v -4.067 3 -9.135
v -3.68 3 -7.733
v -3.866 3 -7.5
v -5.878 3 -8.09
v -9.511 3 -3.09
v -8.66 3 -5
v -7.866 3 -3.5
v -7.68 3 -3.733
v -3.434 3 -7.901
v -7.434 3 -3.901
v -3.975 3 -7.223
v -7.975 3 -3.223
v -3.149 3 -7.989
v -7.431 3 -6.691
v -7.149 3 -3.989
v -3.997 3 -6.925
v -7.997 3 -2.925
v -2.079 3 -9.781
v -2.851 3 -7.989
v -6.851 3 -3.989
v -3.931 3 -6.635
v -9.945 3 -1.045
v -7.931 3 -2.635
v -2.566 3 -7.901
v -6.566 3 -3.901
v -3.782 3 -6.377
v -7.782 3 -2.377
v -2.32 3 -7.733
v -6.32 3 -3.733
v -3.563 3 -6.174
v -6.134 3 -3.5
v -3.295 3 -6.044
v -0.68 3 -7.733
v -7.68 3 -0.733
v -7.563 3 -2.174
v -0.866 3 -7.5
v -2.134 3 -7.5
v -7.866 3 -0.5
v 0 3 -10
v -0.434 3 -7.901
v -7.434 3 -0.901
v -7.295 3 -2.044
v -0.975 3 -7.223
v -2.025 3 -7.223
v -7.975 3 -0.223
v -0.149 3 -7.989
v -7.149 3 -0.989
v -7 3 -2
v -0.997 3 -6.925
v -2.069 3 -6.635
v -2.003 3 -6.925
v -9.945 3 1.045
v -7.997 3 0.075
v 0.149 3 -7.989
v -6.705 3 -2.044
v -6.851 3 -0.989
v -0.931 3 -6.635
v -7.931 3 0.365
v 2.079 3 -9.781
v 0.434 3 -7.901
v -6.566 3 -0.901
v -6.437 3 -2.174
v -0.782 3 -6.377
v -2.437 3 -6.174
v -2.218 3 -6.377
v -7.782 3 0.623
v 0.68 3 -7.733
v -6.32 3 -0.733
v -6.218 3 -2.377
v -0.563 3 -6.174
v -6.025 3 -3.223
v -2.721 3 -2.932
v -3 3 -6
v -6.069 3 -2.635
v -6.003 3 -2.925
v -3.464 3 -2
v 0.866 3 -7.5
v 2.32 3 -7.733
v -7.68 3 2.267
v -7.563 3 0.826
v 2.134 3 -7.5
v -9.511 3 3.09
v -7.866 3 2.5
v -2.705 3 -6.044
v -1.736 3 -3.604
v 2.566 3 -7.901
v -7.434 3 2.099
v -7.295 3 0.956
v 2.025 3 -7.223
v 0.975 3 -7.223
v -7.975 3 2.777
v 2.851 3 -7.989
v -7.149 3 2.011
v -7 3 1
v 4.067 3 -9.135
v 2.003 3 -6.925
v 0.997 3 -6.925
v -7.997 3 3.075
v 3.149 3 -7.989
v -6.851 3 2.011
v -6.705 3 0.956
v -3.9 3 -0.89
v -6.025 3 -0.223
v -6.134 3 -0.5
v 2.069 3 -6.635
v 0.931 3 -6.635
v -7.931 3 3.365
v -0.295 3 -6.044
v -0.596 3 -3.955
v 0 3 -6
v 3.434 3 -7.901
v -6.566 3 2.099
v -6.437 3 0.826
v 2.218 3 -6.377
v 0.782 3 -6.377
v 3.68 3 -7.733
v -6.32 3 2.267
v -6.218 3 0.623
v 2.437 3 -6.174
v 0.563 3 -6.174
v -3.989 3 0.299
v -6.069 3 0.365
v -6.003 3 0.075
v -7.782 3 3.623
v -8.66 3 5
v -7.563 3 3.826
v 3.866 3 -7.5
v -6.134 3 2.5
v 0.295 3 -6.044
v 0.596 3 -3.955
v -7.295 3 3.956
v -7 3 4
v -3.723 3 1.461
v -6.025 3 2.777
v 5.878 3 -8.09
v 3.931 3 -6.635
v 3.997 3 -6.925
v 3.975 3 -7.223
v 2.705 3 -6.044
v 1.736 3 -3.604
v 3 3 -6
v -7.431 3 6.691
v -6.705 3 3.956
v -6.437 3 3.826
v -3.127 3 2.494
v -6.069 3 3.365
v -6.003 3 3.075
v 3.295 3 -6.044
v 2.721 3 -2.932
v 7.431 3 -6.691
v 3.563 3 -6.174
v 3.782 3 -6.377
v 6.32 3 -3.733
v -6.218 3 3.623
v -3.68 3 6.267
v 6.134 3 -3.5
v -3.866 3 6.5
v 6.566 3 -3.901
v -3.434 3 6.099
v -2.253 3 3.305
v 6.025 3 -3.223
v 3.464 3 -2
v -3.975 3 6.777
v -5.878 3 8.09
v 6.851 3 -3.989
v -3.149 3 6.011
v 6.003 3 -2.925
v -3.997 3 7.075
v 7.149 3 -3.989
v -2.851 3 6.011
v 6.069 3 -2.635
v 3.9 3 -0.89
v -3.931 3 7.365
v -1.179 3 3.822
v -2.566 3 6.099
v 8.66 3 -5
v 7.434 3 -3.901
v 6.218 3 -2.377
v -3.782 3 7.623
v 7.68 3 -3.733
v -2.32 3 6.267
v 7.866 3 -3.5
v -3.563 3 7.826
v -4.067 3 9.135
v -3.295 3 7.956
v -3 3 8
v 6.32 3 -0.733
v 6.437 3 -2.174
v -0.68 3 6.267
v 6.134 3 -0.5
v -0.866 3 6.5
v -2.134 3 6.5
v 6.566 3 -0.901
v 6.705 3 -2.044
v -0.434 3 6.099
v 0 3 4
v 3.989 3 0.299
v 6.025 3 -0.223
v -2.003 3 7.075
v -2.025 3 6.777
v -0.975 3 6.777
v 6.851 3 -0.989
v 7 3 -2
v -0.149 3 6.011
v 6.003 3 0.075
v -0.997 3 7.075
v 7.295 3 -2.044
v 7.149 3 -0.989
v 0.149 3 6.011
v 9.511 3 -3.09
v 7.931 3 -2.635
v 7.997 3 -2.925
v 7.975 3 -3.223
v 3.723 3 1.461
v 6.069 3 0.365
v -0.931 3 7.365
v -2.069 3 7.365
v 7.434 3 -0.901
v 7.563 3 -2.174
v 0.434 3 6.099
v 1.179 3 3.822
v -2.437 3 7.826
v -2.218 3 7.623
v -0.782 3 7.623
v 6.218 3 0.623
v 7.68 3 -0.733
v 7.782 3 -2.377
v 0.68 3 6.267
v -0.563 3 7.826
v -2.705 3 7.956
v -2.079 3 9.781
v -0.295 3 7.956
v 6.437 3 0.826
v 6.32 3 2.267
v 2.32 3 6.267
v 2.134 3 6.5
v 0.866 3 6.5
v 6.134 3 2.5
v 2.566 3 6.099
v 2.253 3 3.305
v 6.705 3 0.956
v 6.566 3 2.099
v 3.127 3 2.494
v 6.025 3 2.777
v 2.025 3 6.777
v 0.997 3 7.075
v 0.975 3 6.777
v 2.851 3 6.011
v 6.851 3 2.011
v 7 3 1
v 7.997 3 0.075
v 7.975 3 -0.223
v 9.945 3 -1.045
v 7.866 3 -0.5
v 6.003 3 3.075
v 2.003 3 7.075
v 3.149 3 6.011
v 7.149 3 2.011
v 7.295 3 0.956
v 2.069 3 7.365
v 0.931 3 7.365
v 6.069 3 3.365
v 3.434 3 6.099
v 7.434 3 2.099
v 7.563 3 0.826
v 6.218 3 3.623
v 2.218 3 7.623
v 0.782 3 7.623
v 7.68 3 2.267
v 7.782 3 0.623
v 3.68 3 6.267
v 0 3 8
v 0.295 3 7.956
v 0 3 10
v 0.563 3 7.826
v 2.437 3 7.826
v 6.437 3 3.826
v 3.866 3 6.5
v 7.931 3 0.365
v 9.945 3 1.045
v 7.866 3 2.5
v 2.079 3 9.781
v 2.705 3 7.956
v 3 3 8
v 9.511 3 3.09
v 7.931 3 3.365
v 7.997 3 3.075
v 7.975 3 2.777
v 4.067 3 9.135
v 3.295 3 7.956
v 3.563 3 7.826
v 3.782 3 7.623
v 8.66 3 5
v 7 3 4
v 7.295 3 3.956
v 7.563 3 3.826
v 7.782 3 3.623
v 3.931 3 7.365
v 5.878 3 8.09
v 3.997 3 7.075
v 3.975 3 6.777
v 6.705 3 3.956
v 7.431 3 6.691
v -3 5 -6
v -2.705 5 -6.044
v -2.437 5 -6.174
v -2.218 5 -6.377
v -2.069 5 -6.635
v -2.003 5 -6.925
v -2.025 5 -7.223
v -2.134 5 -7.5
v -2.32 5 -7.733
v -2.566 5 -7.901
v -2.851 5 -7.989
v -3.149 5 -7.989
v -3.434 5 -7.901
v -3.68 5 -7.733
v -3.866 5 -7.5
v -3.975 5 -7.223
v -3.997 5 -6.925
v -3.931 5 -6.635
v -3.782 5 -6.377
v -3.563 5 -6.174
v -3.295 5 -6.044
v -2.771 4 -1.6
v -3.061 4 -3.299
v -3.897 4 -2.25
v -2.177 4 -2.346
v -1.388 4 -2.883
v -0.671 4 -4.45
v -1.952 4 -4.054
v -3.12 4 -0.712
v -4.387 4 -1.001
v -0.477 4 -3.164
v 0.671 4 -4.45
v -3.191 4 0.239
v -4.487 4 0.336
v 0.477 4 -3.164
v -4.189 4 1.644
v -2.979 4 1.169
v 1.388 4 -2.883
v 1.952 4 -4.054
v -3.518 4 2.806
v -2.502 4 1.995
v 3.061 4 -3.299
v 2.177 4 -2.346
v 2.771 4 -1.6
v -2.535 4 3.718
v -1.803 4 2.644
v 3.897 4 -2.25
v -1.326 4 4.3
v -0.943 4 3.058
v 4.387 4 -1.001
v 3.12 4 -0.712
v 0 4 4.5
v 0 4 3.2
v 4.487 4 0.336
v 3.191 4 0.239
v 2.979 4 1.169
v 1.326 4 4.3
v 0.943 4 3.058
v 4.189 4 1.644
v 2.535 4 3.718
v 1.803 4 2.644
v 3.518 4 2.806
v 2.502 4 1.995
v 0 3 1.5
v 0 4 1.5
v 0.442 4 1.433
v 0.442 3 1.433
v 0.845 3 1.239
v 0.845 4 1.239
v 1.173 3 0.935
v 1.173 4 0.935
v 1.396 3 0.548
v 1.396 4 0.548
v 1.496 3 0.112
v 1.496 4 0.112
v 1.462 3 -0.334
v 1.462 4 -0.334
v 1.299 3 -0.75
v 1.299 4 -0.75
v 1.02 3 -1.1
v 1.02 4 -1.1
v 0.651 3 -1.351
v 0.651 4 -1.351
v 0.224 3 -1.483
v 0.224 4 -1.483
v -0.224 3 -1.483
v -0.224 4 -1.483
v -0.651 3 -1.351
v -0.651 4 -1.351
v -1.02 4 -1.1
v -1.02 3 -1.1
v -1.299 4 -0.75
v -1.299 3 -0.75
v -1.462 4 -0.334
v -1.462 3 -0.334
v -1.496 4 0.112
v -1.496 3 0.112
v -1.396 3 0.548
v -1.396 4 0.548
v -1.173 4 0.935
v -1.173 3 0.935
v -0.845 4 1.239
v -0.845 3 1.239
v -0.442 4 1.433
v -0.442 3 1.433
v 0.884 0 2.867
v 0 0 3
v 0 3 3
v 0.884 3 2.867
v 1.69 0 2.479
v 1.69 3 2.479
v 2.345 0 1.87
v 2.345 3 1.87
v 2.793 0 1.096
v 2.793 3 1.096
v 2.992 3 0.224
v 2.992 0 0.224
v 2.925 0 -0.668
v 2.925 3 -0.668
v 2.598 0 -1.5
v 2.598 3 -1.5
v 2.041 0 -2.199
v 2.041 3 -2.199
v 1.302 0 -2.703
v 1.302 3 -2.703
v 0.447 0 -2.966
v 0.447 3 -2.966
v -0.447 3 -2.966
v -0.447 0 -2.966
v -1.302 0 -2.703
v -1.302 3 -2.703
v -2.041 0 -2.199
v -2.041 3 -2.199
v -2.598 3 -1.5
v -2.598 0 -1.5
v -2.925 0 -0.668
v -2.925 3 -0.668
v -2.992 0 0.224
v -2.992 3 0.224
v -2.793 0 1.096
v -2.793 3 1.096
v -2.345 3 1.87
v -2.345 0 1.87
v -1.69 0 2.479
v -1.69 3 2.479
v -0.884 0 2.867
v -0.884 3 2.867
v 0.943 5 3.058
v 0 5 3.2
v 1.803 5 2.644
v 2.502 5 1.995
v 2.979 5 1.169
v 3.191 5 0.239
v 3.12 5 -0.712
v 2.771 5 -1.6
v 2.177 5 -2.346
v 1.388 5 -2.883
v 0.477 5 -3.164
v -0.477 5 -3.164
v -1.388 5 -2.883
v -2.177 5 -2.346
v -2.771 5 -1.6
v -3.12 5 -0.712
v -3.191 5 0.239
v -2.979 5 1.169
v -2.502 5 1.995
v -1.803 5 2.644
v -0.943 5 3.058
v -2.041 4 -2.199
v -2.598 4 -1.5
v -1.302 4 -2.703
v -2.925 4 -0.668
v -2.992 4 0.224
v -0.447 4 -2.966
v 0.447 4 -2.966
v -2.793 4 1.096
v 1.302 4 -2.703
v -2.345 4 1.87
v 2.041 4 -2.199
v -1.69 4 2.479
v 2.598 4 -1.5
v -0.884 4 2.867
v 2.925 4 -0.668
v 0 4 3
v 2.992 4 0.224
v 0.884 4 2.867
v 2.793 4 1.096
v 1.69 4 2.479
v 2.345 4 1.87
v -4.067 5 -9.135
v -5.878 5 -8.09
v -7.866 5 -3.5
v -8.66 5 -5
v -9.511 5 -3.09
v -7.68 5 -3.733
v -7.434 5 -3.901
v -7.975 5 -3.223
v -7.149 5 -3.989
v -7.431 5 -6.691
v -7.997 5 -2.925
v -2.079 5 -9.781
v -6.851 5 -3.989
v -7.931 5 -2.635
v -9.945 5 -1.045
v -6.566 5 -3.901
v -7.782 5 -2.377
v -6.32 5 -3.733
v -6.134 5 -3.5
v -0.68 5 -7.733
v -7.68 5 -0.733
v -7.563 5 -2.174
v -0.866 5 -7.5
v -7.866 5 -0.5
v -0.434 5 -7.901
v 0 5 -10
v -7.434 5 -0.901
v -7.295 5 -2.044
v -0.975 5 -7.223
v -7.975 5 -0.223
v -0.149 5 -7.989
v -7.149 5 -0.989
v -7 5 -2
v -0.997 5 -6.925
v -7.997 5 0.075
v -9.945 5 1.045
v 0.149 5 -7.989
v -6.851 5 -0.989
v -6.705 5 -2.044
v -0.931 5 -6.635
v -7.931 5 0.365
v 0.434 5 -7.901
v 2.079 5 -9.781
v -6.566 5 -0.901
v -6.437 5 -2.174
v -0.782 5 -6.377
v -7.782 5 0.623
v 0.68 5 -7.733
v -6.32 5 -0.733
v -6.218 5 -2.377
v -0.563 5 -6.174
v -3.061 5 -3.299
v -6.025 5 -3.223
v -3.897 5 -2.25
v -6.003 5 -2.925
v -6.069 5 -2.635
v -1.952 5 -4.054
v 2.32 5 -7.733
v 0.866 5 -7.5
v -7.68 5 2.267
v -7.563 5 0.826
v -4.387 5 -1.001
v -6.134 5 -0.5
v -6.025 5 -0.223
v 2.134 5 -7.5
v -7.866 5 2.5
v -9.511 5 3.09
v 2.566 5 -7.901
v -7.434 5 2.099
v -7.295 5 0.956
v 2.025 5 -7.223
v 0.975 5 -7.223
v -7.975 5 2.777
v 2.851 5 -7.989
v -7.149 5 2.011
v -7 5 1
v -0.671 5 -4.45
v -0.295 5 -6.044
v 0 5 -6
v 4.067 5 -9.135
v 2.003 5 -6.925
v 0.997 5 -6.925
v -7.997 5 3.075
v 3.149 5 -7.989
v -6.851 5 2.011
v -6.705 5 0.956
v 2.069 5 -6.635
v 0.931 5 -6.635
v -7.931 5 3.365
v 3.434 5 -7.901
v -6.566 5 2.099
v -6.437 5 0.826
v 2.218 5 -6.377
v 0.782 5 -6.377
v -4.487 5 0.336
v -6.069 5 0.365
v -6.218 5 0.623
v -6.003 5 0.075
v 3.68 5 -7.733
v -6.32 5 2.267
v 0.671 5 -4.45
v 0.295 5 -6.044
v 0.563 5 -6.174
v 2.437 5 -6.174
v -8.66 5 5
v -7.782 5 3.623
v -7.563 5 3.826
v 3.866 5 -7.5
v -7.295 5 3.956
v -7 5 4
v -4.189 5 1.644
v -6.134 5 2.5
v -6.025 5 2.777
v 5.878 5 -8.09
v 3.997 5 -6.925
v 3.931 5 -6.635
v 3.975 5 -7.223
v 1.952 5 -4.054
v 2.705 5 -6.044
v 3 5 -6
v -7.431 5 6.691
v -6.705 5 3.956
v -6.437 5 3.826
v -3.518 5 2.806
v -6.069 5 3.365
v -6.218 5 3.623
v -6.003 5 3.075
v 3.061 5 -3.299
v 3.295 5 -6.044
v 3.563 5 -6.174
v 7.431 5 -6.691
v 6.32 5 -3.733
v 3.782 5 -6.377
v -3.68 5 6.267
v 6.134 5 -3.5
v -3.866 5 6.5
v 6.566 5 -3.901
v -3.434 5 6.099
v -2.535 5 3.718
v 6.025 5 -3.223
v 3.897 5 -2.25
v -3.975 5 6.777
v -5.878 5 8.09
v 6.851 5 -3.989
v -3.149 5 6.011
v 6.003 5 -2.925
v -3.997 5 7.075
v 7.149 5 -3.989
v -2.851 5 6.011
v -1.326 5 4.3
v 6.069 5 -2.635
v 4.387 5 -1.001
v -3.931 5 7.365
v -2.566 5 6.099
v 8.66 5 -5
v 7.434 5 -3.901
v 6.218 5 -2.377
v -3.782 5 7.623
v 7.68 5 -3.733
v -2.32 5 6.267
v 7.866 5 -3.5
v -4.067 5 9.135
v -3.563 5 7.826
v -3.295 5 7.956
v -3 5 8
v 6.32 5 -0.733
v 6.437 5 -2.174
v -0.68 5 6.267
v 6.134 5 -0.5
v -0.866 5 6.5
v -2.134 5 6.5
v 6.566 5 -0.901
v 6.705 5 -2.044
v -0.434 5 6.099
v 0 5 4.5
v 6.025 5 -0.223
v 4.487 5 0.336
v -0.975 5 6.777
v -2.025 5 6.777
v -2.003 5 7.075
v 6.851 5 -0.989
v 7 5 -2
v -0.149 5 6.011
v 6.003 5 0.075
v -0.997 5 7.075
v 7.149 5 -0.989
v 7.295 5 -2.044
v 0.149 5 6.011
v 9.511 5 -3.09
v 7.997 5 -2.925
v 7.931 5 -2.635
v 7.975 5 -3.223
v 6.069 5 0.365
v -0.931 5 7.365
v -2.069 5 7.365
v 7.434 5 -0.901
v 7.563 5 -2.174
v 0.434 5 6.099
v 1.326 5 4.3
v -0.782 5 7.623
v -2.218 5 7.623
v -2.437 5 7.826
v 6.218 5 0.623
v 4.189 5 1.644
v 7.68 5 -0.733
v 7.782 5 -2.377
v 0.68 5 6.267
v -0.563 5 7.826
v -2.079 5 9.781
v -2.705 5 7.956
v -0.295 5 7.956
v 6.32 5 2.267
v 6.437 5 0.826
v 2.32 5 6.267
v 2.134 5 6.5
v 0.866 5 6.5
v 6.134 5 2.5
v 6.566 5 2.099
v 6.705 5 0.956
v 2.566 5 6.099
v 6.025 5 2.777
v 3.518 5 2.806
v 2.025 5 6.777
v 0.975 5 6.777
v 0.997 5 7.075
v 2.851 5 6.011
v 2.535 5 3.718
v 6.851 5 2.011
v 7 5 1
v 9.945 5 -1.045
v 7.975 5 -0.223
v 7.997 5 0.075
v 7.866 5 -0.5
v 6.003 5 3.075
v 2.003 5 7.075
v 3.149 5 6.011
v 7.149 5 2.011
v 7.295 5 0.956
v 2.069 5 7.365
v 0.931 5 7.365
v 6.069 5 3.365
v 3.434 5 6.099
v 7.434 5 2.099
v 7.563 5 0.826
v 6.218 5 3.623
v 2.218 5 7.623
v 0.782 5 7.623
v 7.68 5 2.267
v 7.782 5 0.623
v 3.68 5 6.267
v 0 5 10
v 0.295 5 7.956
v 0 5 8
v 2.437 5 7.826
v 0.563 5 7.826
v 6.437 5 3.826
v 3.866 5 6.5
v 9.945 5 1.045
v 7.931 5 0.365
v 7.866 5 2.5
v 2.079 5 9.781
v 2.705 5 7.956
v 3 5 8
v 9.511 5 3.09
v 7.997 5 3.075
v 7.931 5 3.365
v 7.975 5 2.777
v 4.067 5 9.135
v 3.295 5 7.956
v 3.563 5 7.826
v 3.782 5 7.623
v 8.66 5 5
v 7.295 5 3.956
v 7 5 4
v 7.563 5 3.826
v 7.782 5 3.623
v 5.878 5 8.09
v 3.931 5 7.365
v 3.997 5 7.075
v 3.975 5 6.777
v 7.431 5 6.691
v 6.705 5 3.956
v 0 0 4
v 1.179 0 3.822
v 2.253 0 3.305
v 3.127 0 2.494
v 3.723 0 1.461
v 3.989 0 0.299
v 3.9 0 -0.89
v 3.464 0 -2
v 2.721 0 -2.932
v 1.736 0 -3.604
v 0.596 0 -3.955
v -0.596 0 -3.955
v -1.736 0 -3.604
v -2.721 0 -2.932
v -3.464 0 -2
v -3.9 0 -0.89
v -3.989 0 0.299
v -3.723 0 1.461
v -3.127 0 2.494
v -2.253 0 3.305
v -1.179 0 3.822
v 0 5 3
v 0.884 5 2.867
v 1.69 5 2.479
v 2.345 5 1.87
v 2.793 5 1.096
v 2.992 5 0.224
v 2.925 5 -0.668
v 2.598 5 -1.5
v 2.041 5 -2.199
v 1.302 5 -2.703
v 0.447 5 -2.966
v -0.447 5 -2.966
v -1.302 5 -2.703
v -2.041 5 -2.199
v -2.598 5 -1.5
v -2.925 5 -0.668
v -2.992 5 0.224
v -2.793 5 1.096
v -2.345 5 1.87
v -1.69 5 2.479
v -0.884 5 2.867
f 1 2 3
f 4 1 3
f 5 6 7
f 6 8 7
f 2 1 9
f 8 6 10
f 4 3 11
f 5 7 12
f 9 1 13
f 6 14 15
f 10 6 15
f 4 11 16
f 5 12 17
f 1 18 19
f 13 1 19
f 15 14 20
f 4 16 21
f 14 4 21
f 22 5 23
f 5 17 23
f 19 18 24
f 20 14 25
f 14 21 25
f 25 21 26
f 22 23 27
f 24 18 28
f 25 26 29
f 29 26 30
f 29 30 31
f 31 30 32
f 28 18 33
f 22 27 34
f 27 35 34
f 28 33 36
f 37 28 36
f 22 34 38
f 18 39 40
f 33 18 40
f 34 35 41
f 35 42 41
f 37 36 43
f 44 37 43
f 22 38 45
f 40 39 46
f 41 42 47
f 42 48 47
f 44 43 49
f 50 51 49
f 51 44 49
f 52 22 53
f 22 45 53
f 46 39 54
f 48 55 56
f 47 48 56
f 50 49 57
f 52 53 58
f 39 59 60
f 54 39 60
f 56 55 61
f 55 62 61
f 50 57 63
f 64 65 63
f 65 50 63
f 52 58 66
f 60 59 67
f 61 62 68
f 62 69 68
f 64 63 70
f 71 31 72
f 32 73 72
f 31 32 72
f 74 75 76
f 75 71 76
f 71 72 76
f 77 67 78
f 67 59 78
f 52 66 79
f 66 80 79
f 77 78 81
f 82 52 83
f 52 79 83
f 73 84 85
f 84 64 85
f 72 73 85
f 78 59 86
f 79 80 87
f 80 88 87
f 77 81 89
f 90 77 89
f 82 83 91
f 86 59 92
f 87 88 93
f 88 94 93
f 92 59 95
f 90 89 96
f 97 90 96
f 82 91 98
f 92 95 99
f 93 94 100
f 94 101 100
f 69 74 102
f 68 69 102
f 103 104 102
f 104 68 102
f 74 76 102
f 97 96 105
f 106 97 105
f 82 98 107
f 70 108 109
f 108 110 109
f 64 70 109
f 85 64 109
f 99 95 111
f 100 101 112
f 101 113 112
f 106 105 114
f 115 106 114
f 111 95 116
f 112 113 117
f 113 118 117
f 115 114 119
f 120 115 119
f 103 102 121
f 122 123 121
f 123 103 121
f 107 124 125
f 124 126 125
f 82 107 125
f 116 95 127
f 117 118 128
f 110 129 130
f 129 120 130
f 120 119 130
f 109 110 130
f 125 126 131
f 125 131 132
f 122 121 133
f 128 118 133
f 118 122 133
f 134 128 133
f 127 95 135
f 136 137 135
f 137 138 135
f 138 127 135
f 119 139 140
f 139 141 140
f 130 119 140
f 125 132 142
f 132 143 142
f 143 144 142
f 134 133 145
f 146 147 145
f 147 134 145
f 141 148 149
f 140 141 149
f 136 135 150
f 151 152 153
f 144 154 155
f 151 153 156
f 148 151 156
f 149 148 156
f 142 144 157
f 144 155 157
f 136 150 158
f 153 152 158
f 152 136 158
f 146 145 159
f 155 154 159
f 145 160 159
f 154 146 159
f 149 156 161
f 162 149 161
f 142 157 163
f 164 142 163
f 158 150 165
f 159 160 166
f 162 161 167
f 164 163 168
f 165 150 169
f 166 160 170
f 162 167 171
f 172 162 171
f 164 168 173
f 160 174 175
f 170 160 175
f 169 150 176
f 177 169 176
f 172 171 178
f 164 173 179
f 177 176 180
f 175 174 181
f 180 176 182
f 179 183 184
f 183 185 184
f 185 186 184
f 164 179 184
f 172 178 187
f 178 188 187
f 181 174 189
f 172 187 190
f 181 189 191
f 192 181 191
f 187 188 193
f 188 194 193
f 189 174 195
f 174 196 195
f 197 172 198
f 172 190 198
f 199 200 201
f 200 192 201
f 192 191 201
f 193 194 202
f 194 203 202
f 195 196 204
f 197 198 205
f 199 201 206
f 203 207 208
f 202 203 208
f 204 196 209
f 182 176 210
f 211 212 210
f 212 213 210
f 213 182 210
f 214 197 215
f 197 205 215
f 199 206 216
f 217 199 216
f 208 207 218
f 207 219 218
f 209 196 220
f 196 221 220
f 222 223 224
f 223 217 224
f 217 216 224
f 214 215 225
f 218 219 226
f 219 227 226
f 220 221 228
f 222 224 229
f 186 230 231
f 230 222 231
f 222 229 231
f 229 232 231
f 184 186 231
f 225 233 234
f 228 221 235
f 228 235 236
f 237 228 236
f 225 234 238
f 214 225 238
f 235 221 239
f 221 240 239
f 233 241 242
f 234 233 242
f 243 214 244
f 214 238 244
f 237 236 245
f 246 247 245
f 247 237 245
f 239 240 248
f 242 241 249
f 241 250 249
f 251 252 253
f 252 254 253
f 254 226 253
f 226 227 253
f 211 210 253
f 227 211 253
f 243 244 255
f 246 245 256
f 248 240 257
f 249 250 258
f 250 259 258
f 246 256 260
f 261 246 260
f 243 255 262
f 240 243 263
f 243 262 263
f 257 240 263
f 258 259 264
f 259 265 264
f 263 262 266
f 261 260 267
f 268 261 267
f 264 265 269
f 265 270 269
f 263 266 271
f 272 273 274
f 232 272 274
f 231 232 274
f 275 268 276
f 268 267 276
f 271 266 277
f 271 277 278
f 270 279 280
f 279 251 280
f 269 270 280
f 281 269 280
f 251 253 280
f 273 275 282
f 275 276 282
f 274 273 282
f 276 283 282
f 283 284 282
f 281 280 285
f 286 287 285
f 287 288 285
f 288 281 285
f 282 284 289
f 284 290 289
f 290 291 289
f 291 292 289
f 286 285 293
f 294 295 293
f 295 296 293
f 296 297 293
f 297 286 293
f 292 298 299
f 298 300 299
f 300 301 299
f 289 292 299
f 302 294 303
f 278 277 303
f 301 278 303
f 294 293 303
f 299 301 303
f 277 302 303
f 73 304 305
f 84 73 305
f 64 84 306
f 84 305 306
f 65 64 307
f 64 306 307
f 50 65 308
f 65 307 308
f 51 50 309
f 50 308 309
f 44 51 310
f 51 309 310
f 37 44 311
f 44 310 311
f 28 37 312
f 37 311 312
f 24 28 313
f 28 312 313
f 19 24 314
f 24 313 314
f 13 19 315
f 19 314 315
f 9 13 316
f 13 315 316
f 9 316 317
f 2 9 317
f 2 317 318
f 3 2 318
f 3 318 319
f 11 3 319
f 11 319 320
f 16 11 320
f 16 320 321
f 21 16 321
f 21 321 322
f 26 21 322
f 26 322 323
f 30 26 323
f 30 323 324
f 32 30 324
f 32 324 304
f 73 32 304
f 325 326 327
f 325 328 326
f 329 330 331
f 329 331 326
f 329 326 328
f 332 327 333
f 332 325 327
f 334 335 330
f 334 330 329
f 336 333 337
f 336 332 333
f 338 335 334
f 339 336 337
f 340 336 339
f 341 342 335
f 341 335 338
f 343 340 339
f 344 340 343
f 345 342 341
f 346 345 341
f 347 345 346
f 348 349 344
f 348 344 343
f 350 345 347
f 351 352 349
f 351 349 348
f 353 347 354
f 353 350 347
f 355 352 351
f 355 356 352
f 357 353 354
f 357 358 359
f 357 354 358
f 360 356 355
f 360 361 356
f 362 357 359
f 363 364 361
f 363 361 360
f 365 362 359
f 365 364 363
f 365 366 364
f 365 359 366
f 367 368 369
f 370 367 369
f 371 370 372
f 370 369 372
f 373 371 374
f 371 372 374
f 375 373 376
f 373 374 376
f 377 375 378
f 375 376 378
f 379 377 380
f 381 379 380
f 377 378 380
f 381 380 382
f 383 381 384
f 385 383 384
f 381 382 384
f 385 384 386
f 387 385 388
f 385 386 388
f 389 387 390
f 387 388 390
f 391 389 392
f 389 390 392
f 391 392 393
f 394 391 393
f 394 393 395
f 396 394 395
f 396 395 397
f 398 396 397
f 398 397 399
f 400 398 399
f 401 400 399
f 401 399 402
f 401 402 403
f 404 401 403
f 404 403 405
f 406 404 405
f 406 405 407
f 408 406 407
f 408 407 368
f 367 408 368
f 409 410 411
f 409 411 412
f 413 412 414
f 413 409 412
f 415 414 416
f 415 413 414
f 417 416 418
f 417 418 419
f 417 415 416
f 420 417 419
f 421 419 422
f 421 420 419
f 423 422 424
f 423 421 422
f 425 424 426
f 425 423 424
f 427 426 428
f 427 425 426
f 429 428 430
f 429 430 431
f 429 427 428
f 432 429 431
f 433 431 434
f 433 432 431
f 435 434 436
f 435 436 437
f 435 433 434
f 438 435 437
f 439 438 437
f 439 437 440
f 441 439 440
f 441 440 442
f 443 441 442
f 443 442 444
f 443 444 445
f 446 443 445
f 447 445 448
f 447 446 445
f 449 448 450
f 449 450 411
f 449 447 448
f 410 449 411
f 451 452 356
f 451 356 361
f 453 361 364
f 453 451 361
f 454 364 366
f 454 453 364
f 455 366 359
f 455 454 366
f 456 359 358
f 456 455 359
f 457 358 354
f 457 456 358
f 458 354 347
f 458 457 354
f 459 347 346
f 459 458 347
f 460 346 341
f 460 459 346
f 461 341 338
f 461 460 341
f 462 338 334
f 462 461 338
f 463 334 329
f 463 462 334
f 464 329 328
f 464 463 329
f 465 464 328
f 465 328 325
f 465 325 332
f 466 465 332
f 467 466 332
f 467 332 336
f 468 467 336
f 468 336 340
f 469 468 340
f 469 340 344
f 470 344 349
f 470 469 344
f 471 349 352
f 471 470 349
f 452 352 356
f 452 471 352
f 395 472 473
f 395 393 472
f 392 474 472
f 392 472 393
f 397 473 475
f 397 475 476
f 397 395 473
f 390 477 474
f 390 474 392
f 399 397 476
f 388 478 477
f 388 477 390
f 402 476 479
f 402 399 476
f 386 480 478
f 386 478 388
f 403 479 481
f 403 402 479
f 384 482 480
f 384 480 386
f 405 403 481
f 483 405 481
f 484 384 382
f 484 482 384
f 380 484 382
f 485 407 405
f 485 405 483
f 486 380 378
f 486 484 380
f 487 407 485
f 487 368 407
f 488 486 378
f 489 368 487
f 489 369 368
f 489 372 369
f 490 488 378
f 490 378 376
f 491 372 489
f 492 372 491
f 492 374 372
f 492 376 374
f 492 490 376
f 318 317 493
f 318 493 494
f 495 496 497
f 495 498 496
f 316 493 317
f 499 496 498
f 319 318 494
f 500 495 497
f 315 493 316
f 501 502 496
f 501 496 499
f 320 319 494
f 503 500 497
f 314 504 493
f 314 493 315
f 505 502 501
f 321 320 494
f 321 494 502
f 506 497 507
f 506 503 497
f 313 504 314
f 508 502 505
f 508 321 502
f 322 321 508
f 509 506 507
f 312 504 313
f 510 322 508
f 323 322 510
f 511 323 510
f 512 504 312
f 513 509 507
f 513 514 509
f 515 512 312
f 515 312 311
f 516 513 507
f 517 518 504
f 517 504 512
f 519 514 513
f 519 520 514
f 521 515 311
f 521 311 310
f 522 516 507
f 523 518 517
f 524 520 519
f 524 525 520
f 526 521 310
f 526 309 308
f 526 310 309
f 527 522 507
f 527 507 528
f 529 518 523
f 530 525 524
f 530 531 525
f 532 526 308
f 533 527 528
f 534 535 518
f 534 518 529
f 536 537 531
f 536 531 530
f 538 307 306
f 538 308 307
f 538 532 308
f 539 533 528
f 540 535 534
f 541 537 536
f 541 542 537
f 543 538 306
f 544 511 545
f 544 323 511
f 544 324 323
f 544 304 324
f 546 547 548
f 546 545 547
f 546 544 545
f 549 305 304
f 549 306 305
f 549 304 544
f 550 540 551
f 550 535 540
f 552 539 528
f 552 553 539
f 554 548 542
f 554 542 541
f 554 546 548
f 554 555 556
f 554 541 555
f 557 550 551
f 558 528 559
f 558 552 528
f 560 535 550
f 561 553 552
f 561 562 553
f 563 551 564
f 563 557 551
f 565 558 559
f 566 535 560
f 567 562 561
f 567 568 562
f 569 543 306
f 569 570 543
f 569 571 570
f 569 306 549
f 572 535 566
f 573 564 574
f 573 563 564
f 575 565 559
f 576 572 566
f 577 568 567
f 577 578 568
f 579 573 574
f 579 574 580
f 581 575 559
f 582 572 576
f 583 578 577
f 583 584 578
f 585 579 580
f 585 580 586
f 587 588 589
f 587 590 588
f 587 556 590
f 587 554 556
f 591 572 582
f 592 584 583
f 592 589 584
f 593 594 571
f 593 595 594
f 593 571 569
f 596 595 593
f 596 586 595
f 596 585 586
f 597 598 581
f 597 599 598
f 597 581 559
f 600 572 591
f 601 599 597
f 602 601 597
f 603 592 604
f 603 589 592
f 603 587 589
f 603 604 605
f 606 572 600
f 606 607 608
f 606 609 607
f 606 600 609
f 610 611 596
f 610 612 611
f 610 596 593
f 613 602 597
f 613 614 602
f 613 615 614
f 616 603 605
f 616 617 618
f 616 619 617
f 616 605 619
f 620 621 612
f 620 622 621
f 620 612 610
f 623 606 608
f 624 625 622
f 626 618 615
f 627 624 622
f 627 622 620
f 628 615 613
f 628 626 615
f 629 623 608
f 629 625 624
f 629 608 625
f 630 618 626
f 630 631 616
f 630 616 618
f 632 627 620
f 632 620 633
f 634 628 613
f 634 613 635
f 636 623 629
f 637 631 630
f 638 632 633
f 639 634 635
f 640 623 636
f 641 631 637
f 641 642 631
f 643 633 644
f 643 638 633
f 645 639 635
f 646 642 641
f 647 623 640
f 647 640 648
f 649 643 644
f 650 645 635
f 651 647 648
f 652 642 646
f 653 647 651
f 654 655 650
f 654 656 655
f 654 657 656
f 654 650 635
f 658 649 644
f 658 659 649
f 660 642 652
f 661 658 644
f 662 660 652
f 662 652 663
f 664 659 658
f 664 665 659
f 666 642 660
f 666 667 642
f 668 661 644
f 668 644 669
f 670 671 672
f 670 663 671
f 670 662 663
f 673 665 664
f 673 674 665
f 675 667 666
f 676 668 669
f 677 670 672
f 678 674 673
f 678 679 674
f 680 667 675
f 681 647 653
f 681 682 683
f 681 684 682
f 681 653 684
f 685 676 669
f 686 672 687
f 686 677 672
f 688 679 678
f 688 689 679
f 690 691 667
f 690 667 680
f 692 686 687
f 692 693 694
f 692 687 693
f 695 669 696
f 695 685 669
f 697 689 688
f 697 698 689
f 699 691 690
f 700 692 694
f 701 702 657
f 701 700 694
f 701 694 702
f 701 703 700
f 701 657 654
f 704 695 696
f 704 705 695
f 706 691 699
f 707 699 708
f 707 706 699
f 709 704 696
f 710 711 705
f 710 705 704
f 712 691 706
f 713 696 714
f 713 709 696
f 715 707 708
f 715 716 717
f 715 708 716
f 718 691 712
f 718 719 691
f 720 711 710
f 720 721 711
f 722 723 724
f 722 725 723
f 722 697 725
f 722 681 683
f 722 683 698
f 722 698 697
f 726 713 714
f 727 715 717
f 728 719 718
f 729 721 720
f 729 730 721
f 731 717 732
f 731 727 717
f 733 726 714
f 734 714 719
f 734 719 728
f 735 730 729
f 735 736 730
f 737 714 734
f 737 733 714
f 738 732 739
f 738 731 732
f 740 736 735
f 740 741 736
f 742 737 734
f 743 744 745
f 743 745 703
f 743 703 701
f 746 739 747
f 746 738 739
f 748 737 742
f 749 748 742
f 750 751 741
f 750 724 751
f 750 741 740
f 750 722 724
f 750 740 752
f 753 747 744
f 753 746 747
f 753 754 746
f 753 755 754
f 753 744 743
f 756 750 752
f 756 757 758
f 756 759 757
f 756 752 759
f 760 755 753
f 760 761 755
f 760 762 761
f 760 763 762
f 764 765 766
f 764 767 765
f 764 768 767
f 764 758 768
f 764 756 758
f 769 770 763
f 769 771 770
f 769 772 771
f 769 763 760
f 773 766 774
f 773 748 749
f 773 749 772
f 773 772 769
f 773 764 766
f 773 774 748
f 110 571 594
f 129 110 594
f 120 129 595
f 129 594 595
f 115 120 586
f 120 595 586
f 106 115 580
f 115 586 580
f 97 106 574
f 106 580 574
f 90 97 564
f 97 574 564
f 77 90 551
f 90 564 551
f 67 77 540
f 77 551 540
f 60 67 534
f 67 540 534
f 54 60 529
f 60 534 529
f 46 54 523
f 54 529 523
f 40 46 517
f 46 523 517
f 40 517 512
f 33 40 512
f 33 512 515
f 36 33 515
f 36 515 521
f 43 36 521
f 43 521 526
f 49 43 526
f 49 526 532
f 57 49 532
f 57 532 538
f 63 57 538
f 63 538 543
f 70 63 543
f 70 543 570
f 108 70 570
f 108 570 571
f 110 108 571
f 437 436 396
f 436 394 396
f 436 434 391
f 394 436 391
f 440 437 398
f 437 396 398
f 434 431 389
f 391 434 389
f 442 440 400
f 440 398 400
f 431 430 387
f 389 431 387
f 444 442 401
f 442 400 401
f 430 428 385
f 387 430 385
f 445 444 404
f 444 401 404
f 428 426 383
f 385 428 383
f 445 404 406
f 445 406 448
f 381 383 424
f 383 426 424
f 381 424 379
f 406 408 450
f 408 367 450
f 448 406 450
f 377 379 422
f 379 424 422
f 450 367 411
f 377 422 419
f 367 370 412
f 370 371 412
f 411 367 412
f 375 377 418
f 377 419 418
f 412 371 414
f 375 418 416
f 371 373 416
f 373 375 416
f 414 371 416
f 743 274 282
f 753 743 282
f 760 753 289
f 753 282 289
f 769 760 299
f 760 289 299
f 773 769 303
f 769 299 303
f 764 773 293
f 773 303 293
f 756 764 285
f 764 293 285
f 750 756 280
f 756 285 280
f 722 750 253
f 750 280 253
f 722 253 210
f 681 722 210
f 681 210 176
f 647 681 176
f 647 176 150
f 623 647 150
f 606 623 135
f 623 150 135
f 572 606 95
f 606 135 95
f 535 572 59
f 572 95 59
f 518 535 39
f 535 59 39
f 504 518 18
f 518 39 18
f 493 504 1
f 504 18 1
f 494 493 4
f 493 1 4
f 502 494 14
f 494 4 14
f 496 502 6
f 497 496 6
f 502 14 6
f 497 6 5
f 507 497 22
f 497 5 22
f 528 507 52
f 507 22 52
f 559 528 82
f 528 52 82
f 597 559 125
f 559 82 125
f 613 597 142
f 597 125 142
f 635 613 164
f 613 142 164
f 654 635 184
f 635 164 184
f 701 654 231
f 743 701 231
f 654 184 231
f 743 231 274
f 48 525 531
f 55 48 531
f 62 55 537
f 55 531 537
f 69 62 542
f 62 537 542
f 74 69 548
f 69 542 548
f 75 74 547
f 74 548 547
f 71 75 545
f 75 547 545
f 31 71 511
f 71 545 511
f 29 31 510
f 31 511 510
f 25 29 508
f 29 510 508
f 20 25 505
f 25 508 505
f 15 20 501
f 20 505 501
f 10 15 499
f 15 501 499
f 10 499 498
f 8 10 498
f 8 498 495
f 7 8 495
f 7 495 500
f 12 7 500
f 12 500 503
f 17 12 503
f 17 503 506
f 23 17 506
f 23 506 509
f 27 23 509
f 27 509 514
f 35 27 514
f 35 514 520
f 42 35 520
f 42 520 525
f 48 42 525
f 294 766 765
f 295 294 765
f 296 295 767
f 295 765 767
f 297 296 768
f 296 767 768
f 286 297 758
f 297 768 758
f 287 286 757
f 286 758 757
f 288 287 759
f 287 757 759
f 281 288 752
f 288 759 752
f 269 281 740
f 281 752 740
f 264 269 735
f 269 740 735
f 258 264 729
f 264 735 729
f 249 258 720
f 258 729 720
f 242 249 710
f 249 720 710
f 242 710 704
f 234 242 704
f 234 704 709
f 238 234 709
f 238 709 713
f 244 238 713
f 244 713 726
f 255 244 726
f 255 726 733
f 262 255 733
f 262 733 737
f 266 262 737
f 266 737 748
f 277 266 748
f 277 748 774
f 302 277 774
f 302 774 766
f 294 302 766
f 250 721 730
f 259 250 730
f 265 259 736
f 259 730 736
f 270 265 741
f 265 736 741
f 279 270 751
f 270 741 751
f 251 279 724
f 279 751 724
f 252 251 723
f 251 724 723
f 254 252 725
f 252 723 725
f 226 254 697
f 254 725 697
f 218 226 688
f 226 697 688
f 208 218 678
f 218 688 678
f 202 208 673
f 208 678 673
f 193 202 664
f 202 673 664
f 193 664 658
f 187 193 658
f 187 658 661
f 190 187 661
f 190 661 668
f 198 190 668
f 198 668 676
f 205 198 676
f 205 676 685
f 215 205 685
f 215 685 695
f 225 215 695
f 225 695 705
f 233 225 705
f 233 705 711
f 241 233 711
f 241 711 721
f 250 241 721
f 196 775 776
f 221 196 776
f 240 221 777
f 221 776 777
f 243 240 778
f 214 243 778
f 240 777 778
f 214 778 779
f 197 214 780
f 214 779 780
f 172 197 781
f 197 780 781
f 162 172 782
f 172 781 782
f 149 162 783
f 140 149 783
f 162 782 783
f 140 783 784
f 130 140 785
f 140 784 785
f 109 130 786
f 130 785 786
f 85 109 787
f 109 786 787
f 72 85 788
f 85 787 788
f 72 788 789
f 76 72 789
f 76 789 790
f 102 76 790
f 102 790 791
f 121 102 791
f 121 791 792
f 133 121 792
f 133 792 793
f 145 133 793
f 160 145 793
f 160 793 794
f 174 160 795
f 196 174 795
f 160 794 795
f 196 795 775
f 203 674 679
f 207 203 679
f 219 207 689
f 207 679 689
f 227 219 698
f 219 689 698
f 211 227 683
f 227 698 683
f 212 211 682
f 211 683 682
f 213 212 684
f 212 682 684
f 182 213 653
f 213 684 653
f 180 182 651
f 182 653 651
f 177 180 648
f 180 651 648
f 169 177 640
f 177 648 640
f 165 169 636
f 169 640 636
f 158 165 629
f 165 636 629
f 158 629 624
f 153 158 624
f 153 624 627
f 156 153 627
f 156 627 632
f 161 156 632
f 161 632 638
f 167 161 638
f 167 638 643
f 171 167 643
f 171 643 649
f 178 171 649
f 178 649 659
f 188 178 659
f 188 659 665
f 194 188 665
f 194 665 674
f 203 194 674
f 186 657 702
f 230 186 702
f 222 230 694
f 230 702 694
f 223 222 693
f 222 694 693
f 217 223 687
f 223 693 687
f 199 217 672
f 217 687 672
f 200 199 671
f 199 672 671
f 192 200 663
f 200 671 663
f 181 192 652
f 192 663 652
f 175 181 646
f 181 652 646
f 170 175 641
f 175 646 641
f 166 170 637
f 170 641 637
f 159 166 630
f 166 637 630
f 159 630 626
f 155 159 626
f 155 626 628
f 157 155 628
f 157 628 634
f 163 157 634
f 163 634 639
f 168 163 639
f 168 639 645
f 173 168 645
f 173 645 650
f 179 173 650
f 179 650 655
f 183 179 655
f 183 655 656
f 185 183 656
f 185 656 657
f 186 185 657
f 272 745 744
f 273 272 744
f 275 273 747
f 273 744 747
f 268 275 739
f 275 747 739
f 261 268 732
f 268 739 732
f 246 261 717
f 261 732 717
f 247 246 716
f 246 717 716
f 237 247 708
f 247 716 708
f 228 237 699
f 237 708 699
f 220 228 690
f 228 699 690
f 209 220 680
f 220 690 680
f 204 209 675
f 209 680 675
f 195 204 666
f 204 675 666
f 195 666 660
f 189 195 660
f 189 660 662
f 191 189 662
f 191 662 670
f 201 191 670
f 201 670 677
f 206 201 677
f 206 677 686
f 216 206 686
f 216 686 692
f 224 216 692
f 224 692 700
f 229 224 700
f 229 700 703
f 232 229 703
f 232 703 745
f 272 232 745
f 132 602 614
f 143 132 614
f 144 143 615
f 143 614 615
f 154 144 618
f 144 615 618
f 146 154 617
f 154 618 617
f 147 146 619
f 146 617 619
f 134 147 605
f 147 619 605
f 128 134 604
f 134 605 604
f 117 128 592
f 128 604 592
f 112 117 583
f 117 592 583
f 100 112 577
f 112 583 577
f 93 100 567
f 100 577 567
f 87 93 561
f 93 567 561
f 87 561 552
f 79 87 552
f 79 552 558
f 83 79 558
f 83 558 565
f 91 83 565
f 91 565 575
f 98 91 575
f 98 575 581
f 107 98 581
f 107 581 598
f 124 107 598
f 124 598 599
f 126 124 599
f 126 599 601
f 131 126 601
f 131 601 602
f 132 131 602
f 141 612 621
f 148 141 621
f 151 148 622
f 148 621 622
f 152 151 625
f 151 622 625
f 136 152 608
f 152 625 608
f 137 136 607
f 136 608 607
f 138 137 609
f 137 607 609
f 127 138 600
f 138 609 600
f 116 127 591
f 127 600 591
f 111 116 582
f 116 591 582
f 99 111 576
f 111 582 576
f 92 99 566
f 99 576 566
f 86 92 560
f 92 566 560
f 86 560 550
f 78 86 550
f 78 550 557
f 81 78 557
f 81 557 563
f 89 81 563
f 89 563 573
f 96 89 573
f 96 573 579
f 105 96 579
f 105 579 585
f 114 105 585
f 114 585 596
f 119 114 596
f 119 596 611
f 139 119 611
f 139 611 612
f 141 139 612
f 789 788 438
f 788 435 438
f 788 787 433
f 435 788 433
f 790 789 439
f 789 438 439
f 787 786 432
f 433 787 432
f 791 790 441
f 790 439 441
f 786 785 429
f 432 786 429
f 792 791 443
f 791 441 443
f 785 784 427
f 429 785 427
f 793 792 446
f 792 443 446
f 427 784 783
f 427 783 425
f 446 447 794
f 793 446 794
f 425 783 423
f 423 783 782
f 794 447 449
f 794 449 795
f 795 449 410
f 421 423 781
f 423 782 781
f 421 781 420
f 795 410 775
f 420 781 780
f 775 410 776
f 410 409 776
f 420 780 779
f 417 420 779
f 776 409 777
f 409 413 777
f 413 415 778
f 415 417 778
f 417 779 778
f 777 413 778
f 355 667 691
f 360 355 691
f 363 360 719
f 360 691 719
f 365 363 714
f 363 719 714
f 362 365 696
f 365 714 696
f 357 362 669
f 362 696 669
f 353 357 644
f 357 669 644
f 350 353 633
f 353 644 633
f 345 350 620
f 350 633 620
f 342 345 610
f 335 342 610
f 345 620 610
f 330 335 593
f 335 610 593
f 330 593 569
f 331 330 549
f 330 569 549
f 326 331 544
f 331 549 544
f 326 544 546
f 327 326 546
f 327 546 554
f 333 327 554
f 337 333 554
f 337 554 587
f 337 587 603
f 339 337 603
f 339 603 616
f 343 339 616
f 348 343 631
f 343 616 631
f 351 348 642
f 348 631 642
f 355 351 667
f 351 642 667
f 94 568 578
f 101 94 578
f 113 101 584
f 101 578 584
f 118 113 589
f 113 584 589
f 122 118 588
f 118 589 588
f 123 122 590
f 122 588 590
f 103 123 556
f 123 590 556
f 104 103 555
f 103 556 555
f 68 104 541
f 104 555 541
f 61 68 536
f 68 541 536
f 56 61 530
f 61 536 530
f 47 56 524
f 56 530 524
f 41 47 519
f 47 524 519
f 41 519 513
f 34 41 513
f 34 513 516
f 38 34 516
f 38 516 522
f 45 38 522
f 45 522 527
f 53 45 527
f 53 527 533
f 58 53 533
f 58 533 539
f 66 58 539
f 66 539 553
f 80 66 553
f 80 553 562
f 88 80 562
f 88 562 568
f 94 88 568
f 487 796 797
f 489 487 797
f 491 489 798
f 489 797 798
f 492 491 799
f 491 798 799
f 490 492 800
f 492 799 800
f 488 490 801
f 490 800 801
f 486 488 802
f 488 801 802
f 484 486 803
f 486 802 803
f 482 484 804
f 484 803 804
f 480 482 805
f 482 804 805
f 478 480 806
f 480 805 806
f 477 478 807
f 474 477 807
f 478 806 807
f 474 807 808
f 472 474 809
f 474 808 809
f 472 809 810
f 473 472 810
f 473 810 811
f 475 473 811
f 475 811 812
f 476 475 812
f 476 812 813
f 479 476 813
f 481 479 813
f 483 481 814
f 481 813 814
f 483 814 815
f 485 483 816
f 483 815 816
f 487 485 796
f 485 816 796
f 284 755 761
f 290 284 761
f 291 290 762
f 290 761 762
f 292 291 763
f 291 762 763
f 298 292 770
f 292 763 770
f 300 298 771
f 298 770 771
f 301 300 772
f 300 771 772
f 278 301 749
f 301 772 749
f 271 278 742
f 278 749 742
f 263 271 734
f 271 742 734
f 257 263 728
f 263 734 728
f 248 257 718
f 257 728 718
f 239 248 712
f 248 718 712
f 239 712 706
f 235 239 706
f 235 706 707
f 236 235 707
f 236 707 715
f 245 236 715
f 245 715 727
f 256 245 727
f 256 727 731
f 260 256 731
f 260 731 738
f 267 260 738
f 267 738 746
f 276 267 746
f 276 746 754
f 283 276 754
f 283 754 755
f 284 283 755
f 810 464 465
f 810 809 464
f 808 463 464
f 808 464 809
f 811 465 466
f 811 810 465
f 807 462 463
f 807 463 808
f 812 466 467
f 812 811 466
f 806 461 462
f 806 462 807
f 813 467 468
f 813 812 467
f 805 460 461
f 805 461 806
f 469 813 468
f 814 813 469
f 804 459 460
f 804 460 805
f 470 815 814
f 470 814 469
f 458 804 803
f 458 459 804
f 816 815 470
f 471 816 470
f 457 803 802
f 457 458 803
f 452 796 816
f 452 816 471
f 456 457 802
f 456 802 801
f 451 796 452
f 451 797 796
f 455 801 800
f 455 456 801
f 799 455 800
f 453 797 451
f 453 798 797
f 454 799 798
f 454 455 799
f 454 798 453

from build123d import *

# Parameters (mm, degrees)
SKETCH1_R           = 4
SKETCH1_R_2         = 3
BOSS_EXTRUDE1_DEPTH = 3
SKETCH2_R           = 10
BOSS_EXTRUDE2_DEPTH = 2
CUT_EXTRUDE1_REACH  = 17
SKETCH3_R           = 1
SKETCH3_R_2         = 1.5
SKETCH4_R           = 4.5
SKETCH4_R_2         = 3.2
SKETCH4_R_3         = 3
SKETCH4_R_4         = 1.5
CUT_EXTRUDE2_DEPTH  = 1


with BuildPart() as part:
    # Sketch1 → Boss-Extrude1 (new body)
    with BuildSketch(Plane(origin=(0, 0, 0), x_dir=(1, 0, 0), z_dir=(0, 1, 0))):
        with Locations(Location((0, 0, 0), (0, 0, 270))):
            Circle(SKETCH1_R)
        with Locations(Location((0, 0, 0), (0, 0, 270))):
            Circle(SKETCH1_R_2, mode=Mode.SUBTRACT)
    extrude(amount=BOSS_EXTRUDE1_DEPTH)

    # Sketch2 → Boss-Extrude2 (add)
    with BuildSketch(Plane(origin=(0, 3, 0), x_dir=(1, 0, 0), z_dir=(0, 1, 0))):
        with Locations(Location((0, 0, 0), (0, 0, 270))):
            Circle(SKETCH2_R)
    extrude(amount=BOSS_EXTRUDE2_DEPTH)

    # Sketch3 → Cut-Extrude1 (cut, up to next)
    with BuildSketch(Plane(origin=(0, 5, 0), x_dir=(1, 0, 0), z_dir=(0, 1, 0)), mode=Mode.PRIVATE) as cut_extrude1_sk1:
        with Locations(Location((0, 7, 0), (0, 0, 270))):
            Circle(SKETCH3_R)
    cut_extrude1_tool1 = extrude(cut_extrude1_sk1.sketch, amount=-CUT_EXTRUDE1_REACH, mode=Mode.PRIVATE) & part.part
    # Sketch3 → Cut-Extrude1 (cut, up to next)
    with BuildSketch(Plane(origin=(0, 5, 0), x_dir=(1, 0, 0), z_dir=(0, 1, 0)), mode=Mode.PRIVATE) as cut_extrude1_sk2:
        with Locations(Location((3, 7, 0), (0, 0, 270))):
            Circle(SKETCH3_R)
    cut_extrude1_tool2 = extrude(cut_extrude1_sk2.sketch, amount=-CUT_EXTRUDE1_REACH, mode=Mode.PRIVATE) & part.part
    # Sketch3 → Cut-Extrude1 (cut, up to next)
    with BuildSketch(Plane(origin=(0, 5, 0), x_dir=(1, 0, 0), z_dir=(0, 1, 0)), mode=Mode.PRIVATE) as cut_extrude1_sk3:
        with Locations(Location((-3, 7, 0), (0, 0, 270))):
            Circle(SKETCH3_R)
    cut_extrude1_tool3 = extrude(cut_extrude1_sk3.sketch, amount=-CUT_EXTRUDE1_REACH, mode=Mode.PRIVATE) & part.part
    # Sketch3 → Cut-Extrude1 (cut, up to next)
    with BuildSketch(Plane(origin=(0, 5, 0), x_dir=(1, 0, 0), z_dir=(0, 1, 0)), mode=Mode.PRIVATE) as cut_extrude1_sk4:
        with Locations(Location((7, 3, 0), (0, 0, 270))):
            Circle(SKETCH3_R)
    cut_extrude1_tool4 = extrude(cut_extrude1_sk4.sketch, amount=-CUT_EXTRUDE1_REACH, mode=Mode.PRIVATE) & part.part
    # Sketch3 → Cut-Extrude1 (cut, up to next)
    with BuildSketch(Plane(origin=(0, 5, 0), x_dir=(1, 0, 0), z_dir=(0, 1, 0)), mode=Mode.PRIVATE) as cut_extrude1_sk5:
        with Locations(Location((7, 0, 0), (0, 0, 270))):
            Circle(SKETCH3_R)
    cut_extrude1_tool5 = extrude(cut_extrude1_sk5.sketch, amount=-CUT_EXTRUDE1_REACH, mode=Mode.PRIVATE) & part.part
    # Sketch3 → Cut-Extrude1 (cut, up to next)
    with BuildSketch(Plane(origin=(0, 5, 0), x_dir=(1, 0, 0), z_dir=(0, 1, 0)), mode=Mode.PRIVATE) as cut_extrude1_sk6:
        with Locations(Location((7, -3, 0), (0, 0, 270))):
            Circle(SKETCH3_R)
    cut_extrude1_tool6 = extrude(cut_extrude1_sk6.sketch, amount=-CUT_EXTRUDE1_REACH, mode=Mode.PRIVATE) & part.part
    # Sketch3 → Cut-Extrude1 (cut, up to next)
    with BuildSketch(Plane(origin=(0, 5, 0), x_dir=(1, 0, 0), z_dir=(0, 1, 0)), mode=Mode.PRIVATE) as cut_extrude1_sk7:
        with Locations(Location((3, -7, 0), (0, 0, 270))):
            Circle(SKETCH3_R)
    cut_extrude1_tool7 = extrude(cut_extrude1_sk7.sketch, amount=-CUT_EXTRUDE1_REACH, mode=Mode.PRIVATE) & part.part
    # Sketch3 → Cut-Extrude1 (cut, up to next)
    with BuildSketch(Plane(origin=(0, 5, 0), x_dir=(1, 0, 0), z_dir=(0, 1, 0)), mode=Mode.PRIVATE) as cut_extrude1_sk8:
        with Locations(Location((0, -7, 0), (0, 0, 270))):
            Circle(SKETCH3_R)
    cut_extrude1_tool8 = extrude(cut_extrude1_sk8.sketch, amount=-CUT_EXTRUDE1_REACH, mode=Mode.PRIVATE) & part.part
    # Sketch3 → Cut-Extrude1 (cut, up to next)
    with BuildSketch(Plane(origin=(0, 5, 0), x_dir=(1, 0, 0), z_dir=(0, 1, 0)), mode=Mode.PRIVATE) as cut_extrude1_sk9:
        with Locations(Location((-3, -7, 0), (0, 0, 270))):
            Circle(SKETCH3_R)
    cut_extrude1_tool9 = extrude(cut_extrude1_sk9.sketch, amount=-CUT_EXTRUDE1_REACH, mode=Mode.PRIVATE) & part.part
    # Sketch3 → Cut-Extrude1 (cut, up to next)
    with BuildSketch(Plane(origin=(0, 5, 0), x_dir=(1, 0, 0), z_dir=(0, 1, 0)), mode=Mode.PRIVATE) as cut_extrude1_sk10:
        with Locations(Location((-7, -3, 0), (0, 0, 270))):
            Circle(SKETCH3_R)
    cut_extrude1_tool10 = extrude(cut_extrude1_sk10.sketch, amount=-CUT_EXTRUDE1_REACH, mode=Mode.PRIVATE) & part.part
    # Sketch3 → Cut-Extrude1 (cut, up to next)
    with BuildSketch(Plane(origin=(0, 5, 0), x_dir=(1, 0, 0), z_dir=(0, 1, 0)), mode=Mode.PRIVATE) as cut_extrude1_sk11:
        with Locations(Location((-7, 0, 0), (0, 0, 270))):
            Circle(SKETCH3_R)
    cut_extrude1_tool11 = extrude(cut_extrude1_sk11.sketch, amount=-CUT_EXTRUDE1_REACH, mode=Mode.PRIVATE) & part.part
    # Sketch3 → Cut-Extrude1 (cut, up to next)
    with BuildSketch(Plane(origin=(0, 5, 0), x_dir=(1, 0, 0), z_dir=(0, 1, 0)), mode=Mode.PRIVATE) as cut_extrude1_sk12:
        with Locations(Location((-7, 3, 0), (0, 0, 270))):
            Circle(SKETCH3_R)
    cut_extrude1_tool12 = extrude(cut_extrude1_sk12.sketch, amount=-CUT_EXTRUDE1_REACH, mode=Mode.PRIVATE) & part.part
    # Sketch3 → Cut-Extrude1 (cut, up to next)
    with BuildSketch(Plane(origin=(0, 5, 0), x_dir=(1, 0, 0), z_dir=(0, 1, 0)), mode=Mode.PRIVATE) as cut_extrude1_sk13:
        with Locations(Location((0, 0, 0), (0, 0, 270))):
            Circle(SKETCH3_R_2)
    cut_extrude1_tool13 = extrude(cut_extrude1_sk13.sketch, amount=-CUT_EXTRUDE1_REACH, mode=Mode.PRIVATE) & part.part
    add(cut_extrude1_tool1.solids().sort_by_distance((0, 5, -7))[0], mode=Mode.SUBTRACT)
    add(cut_extrude1_tool2.solids().sort_by_distance((3, 5, -7))[0], mode=Mode.SUBTRACT)
    add(cut_extrude1_tool3.solids().sort_by_distance((-3, 5, -7))[0], mode=Mode.SUBTRACT)
    add(cut_extrude1_tool4.solids().sort_by_distance((7, 5, -3))[0], mode=Mode.SUBTRACT)
    add(cut_extrude1_tool5.solids().sort_by_distance((7, 5, 0))[0], mode=Mode.SUBTRACT)
    add(cut_extrude1_tool6.solids().sort_by_distance((7, 5, 3))[0], mode=Mode.SUBTRACT)
    add(cut_extrude1_tool7.solids().sort_by_distance((3, 5, 7))[0], mode=Mode.SUBTRACT)
    add(cut_extrude1_tool8.solids().sort_by_distance((0, 5, 7))[0], mode=Mode.SUBTRACT)
    add(cut_extrude1_tool9.solids().sort_by_distance((-3, 5, 7))[0], mode=Mode.SUBTRACT)
    add(cut_extrude1_tool10.solids().sort_by_distance((-7, 5, 3))[0], mode=Mode.SUBTRACT)
    add(cut_extrude1_tool11.solids().sort_by_distance((-7, 5, 0))[0], mode=Mode.SUBTRACT)
    add(cut_extrude1_tool12.solids().sort_by_distance((-7, 5, -3))[0], mode=Mode.SUBTRACT)
    add(cut_extrude1_tool13.solids().sort_by_distance((0, 5, 0))[0], mode=Mode.SUBTRACT)

    # Sketch4 → Cut-Extrude2 (cut)
    # profile 1 of 2: a face of its own
    with BuildSketch(Plane(origin=(0, 5, 0), x_dir=(1, 0, 0), z_dir=(0, 1, 0))):
        with Locations(Location((0, 0, 0), (0, 0, 270))):
            Circle(SKETCH4_R)
        with Locations(Location((0, 0, 0), (0, 0, 270))):
            Circle(SKETCH4_R_2, mode=Mode.SUBTRACT)
    # profile 2 of 2: a face of its own
    with BuildSketch(Plane(origin=(0, 5, 0), x_dir=(1, 0, 0), z_dir=(0, 1, 0))):
        with Locations(Location((0, 0, 0), (0, 0, 270))):
            Circle(SKETCH4_R_3)
        with Locations(Location((0, 0, 0), (0, 0, 270))):
            Circle(SKETCH4_R_4, mode=Mode.SUBTRACT)
    extrude(amount=-CUT_EXTRUDE2_DEPTH, mode=Mode.SUBTRACT)


solid = part.part
